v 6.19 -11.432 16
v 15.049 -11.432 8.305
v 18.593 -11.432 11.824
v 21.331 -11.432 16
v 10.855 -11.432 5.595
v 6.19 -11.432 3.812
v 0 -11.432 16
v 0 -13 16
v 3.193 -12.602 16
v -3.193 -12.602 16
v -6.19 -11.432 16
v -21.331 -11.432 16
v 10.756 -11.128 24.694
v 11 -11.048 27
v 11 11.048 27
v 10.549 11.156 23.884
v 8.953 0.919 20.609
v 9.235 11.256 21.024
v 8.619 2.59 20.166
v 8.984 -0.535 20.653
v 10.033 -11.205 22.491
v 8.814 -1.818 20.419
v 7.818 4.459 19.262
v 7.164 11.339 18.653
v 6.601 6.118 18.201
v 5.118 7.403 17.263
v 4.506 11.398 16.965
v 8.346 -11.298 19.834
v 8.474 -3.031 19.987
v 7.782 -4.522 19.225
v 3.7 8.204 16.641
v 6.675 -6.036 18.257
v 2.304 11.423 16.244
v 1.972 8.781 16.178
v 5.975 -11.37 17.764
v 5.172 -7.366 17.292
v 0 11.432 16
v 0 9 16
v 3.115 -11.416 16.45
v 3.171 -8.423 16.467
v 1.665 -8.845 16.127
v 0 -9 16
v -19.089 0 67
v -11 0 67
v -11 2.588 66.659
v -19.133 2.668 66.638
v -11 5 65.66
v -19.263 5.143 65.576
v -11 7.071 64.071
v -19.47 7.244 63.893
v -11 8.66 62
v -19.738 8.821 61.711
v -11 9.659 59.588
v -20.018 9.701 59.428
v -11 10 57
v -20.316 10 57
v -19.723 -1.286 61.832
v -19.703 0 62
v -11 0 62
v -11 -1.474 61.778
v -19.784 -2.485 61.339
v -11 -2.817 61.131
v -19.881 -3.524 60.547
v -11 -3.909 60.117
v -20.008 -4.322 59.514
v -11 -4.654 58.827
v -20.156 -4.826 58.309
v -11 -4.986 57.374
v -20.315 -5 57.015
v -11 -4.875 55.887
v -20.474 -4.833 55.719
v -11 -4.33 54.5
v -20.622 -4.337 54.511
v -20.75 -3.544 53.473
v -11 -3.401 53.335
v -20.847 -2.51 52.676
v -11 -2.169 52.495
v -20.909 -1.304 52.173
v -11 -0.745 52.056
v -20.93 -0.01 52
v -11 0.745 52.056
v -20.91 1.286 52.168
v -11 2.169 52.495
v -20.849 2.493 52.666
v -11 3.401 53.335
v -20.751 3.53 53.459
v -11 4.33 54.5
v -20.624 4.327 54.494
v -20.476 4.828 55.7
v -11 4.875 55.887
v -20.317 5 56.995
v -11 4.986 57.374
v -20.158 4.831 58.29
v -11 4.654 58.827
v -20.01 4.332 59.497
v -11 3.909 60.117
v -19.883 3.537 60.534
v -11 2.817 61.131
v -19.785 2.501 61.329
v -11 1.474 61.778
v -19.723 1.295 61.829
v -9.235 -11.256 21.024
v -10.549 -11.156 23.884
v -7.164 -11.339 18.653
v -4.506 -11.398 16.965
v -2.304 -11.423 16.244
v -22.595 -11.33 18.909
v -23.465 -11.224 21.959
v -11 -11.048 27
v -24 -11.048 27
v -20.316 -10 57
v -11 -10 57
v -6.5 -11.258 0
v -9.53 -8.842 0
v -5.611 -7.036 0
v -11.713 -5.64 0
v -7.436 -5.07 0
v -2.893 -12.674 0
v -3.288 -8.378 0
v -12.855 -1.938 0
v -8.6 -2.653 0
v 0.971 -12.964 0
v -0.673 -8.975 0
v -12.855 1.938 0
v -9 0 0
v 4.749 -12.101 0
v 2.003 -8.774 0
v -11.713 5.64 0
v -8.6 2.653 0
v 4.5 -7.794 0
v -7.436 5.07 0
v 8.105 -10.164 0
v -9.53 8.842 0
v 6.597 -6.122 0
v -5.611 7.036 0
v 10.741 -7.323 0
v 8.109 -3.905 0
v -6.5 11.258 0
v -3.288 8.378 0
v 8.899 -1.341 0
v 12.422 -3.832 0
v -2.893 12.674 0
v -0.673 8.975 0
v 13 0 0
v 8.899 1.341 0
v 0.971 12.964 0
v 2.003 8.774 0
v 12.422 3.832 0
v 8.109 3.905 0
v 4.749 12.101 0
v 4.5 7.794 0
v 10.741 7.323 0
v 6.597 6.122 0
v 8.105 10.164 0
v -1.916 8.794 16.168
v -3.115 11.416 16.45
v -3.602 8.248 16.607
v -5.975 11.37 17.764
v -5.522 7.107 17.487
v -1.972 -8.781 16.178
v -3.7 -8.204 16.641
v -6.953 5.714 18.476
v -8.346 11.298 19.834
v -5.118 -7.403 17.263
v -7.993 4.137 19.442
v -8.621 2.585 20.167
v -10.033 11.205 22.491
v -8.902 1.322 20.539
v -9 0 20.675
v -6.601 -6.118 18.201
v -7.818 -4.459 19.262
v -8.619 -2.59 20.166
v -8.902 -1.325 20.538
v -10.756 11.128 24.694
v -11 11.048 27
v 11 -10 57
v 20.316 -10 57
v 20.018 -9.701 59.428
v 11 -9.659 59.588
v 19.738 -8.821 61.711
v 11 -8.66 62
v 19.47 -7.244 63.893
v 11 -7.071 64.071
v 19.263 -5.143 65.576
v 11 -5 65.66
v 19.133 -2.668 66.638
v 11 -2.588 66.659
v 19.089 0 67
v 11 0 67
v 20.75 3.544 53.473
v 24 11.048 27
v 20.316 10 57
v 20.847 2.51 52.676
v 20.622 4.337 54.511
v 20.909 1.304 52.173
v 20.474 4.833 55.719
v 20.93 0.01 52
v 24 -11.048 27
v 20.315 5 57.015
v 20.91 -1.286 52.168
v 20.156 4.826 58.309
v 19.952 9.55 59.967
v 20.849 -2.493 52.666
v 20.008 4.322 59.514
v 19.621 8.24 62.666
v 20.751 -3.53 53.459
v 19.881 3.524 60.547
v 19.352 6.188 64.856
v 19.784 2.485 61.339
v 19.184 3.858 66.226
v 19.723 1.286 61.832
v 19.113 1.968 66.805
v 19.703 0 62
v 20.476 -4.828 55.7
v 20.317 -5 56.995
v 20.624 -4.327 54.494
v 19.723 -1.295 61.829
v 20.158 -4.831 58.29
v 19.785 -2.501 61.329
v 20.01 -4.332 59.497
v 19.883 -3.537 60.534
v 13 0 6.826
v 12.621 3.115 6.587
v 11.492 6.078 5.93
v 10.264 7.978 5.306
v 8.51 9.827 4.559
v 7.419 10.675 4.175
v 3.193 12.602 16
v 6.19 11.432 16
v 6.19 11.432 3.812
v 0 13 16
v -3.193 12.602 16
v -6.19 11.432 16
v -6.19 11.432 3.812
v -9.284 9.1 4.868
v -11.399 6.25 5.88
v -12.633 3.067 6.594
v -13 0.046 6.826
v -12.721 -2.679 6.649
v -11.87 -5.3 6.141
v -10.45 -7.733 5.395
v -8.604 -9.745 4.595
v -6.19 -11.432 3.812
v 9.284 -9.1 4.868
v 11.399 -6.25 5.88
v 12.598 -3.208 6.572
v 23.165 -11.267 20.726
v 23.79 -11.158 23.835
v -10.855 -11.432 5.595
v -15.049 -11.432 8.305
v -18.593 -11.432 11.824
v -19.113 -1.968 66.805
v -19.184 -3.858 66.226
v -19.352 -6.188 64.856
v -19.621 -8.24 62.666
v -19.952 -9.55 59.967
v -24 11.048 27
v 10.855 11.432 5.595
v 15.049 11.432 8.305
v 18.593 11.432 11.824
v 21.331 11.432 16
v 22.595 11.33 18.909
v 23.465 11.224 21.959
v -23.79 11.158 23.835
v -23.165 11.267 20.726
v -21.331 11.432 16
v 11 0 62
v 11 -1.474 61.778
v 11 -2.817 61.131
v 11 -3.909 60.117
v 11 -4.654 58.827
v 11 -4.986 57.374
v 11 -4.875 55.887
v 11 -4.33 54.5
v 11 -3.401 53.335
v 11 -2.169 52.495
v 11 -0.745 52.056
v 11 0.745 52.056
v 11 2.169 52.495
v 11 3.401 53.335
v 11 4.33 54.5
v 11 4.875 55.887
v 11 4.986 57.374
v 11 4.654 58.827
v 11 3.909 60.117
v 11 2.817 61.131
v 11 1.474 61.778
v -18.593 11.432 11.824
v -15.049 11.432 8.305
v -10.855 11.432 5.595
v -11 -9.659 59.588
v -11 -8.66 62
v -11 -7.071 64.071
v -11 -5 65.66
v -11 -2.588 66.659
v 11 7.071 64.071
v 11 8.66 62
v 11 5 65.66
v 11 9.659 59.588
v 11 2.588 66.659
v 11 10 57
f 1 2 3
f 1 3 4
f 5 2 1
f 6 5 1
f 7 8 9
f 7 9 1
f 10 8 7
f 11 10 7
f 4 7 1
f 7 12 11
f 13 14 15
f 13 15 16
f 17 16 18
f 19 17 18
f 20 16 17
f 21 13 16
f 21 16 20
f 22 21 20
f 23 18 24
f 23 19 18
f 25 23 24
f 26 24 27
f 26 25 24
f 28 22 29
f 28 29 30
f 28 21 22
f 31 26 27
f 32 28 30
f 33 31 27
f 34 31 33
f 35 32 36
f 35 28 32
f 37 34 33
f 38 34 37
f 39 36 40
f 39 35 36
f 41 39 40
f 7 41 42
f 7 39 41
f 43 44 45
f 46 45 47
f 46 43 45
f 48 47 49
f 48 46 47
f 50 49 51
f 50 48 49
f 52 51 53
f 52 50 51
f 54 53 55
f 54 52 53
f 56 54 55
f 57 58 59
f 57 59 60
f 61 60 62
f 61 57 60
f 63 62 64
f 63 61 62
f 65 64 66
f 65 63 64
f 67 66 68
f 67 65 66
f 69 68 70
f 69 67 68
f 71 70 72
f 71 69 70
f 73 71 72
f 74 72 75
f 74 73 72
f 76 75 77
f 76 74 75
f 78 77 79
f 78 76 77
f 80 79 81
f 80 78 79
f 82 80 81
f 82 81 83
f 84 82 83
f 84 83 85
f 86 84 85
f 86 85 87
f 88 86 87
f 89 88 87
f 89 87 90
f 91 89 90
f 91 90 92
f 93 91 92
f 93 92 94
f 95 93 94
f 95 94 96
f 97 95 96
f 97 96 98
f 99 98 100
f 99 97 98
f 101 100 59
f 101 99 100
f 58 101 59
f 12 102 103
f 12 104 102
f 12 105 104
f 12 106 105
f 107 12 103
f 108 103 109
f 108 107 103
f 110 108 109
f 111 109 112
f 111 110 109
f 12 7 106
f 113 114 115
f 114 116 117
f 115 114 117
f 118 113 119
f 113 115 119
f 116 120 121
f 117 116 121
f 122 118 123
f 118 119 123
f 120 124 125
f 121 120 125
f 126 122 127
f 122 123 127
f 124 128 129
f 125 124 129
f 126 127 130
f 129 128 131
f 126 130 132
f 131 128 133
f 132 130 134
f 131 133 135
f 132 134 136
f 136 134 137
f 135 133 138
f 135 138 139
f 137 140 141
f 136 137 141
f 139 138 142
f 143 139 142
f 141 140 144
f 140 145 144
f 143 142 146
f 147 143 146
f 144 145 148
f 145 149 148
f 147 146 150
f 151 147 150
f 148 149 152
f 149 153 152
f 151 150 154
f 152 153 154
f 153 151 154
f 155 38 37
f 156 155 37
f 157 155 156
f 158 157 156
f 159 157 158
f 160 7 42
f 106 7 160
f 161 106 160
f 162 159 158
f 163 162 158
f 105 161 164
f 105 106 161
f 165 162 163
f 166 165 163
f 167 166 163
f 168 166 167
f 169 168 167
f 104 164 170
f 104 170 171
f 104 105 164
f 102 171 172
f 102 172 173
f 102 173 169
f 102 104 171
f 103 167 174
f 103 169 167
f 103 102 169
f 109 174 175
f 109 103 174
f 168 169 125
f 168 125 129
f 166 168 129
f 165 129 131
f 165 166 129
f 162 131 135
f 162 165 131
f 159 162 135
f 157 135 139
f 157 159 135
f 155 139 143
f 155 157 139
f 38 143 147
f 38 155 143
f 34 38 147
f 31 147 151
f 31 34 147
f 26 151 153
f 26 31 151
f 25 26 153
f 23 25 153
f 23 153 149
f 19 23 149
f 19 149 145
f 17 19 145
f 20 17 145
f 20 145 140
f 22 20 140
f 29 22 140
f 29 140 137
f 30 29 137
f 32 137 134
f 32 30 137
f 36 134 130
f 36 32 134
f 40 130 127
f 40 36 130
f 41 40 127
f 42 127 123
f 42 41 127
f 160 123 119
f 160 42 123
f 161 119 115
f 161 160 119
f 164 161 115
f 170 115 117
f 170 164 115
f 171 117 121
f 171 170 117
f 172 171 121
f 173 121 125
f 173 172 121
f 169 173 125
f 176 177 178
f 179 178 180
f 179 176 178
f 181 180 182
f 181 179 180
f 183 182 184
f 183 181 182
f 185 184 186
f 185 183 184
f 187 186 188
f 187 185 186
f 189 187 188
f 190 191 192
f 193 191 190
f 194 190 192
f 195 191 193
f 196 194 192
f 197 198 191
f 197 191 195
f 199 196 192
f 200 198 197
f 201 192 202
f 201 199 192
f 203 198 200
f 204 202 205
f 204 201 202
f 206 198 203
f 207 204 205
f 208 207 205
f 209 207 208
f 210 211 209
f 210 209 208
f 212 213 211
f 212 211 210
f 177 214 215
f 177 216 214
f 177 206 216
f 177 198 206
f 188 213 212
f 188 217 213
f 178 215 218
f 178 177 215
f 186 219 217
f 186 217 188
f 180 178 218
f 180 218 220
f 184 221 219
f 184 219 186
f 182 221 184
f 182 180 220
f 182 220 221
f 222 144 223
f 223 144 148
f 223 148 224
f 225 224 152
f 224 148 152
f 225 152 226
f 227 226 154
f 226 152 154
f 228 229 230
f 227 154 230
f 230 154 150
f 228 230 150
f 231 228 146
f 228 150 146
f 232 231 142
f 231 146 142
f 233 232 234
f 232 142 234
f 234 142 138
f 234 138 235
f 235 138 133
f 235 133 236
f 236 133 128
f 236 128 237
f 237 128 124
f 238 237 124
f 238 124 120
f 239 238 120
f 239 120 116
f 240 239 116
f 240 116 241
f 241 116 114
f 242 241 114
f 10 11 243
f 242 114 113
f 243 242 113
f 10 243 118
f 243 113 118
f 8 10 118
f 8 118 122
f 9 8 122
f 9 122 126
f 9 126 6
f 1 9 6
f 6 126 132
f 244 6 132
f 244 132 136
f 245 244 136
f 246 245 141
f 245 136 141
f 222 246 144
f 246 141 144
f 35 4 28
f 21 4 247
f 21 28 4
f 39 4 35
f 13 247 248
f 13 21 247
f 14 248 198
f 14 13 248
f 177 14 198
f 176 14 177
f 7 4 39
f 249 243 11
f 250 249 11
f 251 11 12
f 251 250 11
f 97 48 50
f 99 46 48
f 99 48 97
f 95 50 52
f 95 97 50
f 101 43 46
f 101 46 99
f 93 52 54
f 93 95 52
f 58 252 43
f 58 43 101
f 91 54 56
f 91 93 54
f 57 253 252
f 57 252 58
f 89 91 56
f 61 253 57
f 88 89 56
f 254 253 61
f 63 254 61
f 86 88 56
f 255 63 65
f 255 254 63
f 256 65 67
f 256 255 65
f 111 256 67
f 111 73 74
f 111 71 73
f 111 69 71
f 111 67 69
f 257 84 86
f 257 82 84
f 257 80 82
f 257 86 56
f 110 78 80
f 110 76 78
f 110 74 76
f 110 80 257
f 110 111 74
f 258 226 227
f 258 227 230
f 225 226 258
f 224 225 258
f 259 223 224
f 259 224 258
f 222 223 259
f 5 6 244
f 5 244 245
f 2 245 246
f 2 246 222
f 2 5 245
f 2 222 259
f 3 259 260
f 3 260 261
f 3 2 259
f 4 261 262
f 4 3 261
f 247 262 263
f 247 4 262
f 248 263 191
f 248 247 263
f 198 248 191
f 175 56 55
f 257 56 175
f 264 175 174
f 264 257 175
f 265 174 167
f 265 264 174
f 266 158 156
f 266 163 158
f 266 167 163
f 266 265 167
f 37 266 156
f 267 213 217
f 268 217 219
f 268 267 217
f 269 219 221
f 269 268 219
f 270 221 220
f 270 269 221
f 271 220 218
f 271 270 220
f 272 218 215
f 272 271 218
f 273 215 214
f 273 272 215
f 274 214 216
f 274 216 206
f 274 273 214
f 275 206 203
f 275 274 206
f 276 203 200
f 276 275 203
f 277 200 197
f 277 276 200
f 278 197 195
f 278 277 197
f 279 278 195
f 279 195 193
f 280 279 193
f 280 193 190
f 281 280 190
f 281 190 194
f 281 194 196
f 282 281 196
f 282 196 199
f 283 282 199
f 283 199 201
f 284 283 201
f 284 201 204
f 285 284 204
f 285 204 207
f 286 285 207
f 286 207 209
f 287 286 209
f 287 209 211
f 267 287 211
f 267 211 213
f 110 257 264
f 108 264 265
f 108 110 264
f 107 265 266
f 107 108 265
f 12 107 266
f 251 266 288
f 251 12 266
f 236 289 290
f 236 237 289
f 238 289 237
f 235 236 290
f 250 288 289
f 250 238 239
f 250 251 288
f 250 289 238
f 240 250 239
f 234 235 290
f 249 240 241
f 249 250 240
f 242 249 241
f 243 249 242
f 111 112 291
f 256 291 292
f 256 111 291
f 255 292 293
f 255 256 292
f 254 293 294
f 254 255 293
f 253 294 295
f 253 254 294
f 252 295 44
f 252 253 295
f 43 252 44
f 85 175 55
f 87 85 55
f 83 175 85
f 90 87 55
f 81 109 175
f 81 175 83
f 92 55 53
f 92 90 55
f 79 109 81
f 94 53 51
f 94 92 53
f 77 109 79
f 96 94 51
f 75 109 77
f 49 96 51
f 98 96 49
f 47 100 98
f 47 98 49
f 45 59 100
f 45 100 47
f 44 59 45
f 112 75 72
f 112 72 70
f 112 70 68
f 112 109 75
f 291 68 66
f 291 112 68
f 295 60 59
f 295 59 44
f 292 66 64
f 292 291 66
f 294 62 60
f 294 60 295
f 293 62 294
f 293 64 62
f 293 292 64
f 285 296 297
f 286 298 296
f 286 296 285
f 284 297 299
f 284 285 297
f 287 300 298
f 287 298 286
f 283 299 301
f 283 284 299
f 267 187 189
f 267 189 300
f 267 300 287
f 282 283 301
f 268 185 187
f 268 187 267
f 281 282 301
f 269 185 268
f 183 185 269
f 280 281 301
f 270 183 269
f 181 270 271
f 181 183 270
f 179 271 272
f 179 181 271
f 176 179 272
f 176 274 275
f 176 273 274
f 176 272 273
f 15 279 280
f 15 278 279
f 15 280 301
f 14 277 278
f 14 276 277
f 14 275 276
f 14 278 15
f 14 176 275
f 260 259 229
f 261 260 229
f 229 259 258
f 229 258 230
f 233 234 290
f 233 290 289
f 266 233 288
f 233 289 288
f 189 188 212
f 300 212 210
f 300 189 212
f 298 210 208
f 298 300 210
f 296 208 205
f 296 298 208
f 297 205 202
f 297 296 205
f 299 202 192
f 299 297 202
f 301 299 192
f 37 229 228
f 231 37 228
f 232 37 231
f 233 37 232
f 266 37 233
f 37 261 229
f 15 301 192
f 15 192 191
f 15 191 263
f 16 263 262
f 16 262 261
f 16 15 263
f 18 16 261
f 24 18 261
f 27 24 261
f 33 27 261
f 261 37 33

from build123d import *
from build123d.topology import SkipClean

# Parameters (mm, degrees)
SKETCH1_R                = 13
BOSS_EXTRUDE1_DEPTH      = 16
BOSS_EXTRUDE2_DEPTH      = 11.431752
BOSS_EXTRUDE2_DEPTH_BACK = 11.431752
CUT_EXTRUDE1_DEPTH       = 73.346389042
CUT_EXTRUDE1_DEPTH_BACK  = 73.346389042
CUT_EXTRUDE2_DEPTH       = 73.346389042
CUT_EXTRUDE2_DEPTH_BACK  = 73.346389042
SKETCH4_R                = 5
CUT_EXTRUDE3_DEPTH       = 73.346389042
CUT_EXTRUDE3_DEPTH_BACK  = 73.346389042
SKETCH5_R                = 9


with BuildPart() as part:
    # Sketch1 → Boss-Extrude1 (new body)
    with BuildSketch(Plane.XY):
        Circle(SKETCH1_R)
    extrude(amount=BOSS_EXTRUDE1_DEPTH)

    # Sketch2 → Boss-Extrude2 (add, two sides: drawn at the far end of the back side and taken through both)
    with BuildSketch(Plane(origin=(0, 0, 0), x_dir=(1, 0, 0), z_dir=(0, 1, 0)).offset(-BOSS_EXTRUDE2_DEPTH_BACK)):
        with BuildLine():
            Line((-11, -27), (-11, -67))
            Line((-11, -67), (-19.088617564, -67))
            Line((-19.088617564, -67), (-24, -27))
            ThreePointArc((-24, -27), (-16.970562748, -10.029437252), (0, -3))
            ThreePointArc((0, -3), (16.970562748, -10.029437252), (24, -27))
            Line((24, -27), (19.088617564, -67))
            Line((19.088617564, -67), (11, -67))
            Line((11, -67), (11, -27))
            ThreePointArc((11, -27), (7.778174593, -19.221825407), (0, -16))
            ThreePointArc((0, -16), (-7.778174593, -19.221825407), (-11, -27))
        make_face()
    extrude(amount=BOSS_EXTRUDE2_DEPTH + BOSS_EXTRUDE2_DEPTH_BACK)

    # Sketch3 → Cut-Extrude1 (cut, two sides: drawn at the far end of the back side and taken through both)
    with BuildSketch(Plane(origin=(0, 0, 0), x_dir=(0, 0, -1), z_dir=(1, 0, 0)).offset(-CUT_EXTRUDE1_DEPTH_BACK)):
        with BuildLine():
            ThreePointArc((-67, 0), (-64.071067812, 7.071067812), (-57, 10))
            Line((-57, 10), (-16, 11.431751549))
            Line((-16, 11.431751549), (-16, 13))
            Line((-16, 13), (-67, 13))
            Line((-67, 13), (-67, 0))
        make_face()
        with BuildLine():
            ThreePointArc((-57, -10), (-64.071067812, -7.071067812), (-67, 0))
            Line((-67, 0), (-67, -13))
            Line((-67, -13), (-16, -13))
            Line((-16, -13), (-16, -11.431751549))
            Line((-16, -11.431751549), (-57, -10))
        make_face()
    extrude(amount=CUT_EXTRUDE1_DEPTH + CUT_EXTRUDE1_DEPTH_BACK, mode=Mode.SUBTRACT)

    # Sketch4 → Cut-Extrude2 (cut, two sides: drawn at the far end of the back side and taken through both)
    with BuildSketch(Plane(origin=(0, 0, 0), x_dir=(0, 0, -1), z_dir=(1, 0, 0)).offset(-CUT_EXTRUDE2_DEPTH_BACK)):
        with Locations(Location((-57, 0, 0), (0, 0, 180))):
            Circle(SKETCH4_R)
    extrude(amount=CUT_EXTRUDE2_DEPTH + CUT_EXTRUDE2_DEPTH_BACK, mode=Mode.SUBTRACT)

    # Sketch5 → Cut-Extrude3 (cut, two sides: drawn at the far end of the back side and taken through both)
    with SkipClean():  # the faces are left unmerged after this step: merging them gives an invalid solid
        with BuildSketch(Plane(origin=(0, 0, 0), x_dir=(-1, 0, 0), z_dir=(0, 0, -1)).offset(-CUT_EXTRUDE3_DEPTH_BACK)):
            Circle(SKETCH5_R)
        extrude(amount=CUT_EXTRUDE3_DEPTH + CUT_EXTRUDE3_DEPTH_BACK, mode=Mode.SUBTRACT)


solid = part.part
